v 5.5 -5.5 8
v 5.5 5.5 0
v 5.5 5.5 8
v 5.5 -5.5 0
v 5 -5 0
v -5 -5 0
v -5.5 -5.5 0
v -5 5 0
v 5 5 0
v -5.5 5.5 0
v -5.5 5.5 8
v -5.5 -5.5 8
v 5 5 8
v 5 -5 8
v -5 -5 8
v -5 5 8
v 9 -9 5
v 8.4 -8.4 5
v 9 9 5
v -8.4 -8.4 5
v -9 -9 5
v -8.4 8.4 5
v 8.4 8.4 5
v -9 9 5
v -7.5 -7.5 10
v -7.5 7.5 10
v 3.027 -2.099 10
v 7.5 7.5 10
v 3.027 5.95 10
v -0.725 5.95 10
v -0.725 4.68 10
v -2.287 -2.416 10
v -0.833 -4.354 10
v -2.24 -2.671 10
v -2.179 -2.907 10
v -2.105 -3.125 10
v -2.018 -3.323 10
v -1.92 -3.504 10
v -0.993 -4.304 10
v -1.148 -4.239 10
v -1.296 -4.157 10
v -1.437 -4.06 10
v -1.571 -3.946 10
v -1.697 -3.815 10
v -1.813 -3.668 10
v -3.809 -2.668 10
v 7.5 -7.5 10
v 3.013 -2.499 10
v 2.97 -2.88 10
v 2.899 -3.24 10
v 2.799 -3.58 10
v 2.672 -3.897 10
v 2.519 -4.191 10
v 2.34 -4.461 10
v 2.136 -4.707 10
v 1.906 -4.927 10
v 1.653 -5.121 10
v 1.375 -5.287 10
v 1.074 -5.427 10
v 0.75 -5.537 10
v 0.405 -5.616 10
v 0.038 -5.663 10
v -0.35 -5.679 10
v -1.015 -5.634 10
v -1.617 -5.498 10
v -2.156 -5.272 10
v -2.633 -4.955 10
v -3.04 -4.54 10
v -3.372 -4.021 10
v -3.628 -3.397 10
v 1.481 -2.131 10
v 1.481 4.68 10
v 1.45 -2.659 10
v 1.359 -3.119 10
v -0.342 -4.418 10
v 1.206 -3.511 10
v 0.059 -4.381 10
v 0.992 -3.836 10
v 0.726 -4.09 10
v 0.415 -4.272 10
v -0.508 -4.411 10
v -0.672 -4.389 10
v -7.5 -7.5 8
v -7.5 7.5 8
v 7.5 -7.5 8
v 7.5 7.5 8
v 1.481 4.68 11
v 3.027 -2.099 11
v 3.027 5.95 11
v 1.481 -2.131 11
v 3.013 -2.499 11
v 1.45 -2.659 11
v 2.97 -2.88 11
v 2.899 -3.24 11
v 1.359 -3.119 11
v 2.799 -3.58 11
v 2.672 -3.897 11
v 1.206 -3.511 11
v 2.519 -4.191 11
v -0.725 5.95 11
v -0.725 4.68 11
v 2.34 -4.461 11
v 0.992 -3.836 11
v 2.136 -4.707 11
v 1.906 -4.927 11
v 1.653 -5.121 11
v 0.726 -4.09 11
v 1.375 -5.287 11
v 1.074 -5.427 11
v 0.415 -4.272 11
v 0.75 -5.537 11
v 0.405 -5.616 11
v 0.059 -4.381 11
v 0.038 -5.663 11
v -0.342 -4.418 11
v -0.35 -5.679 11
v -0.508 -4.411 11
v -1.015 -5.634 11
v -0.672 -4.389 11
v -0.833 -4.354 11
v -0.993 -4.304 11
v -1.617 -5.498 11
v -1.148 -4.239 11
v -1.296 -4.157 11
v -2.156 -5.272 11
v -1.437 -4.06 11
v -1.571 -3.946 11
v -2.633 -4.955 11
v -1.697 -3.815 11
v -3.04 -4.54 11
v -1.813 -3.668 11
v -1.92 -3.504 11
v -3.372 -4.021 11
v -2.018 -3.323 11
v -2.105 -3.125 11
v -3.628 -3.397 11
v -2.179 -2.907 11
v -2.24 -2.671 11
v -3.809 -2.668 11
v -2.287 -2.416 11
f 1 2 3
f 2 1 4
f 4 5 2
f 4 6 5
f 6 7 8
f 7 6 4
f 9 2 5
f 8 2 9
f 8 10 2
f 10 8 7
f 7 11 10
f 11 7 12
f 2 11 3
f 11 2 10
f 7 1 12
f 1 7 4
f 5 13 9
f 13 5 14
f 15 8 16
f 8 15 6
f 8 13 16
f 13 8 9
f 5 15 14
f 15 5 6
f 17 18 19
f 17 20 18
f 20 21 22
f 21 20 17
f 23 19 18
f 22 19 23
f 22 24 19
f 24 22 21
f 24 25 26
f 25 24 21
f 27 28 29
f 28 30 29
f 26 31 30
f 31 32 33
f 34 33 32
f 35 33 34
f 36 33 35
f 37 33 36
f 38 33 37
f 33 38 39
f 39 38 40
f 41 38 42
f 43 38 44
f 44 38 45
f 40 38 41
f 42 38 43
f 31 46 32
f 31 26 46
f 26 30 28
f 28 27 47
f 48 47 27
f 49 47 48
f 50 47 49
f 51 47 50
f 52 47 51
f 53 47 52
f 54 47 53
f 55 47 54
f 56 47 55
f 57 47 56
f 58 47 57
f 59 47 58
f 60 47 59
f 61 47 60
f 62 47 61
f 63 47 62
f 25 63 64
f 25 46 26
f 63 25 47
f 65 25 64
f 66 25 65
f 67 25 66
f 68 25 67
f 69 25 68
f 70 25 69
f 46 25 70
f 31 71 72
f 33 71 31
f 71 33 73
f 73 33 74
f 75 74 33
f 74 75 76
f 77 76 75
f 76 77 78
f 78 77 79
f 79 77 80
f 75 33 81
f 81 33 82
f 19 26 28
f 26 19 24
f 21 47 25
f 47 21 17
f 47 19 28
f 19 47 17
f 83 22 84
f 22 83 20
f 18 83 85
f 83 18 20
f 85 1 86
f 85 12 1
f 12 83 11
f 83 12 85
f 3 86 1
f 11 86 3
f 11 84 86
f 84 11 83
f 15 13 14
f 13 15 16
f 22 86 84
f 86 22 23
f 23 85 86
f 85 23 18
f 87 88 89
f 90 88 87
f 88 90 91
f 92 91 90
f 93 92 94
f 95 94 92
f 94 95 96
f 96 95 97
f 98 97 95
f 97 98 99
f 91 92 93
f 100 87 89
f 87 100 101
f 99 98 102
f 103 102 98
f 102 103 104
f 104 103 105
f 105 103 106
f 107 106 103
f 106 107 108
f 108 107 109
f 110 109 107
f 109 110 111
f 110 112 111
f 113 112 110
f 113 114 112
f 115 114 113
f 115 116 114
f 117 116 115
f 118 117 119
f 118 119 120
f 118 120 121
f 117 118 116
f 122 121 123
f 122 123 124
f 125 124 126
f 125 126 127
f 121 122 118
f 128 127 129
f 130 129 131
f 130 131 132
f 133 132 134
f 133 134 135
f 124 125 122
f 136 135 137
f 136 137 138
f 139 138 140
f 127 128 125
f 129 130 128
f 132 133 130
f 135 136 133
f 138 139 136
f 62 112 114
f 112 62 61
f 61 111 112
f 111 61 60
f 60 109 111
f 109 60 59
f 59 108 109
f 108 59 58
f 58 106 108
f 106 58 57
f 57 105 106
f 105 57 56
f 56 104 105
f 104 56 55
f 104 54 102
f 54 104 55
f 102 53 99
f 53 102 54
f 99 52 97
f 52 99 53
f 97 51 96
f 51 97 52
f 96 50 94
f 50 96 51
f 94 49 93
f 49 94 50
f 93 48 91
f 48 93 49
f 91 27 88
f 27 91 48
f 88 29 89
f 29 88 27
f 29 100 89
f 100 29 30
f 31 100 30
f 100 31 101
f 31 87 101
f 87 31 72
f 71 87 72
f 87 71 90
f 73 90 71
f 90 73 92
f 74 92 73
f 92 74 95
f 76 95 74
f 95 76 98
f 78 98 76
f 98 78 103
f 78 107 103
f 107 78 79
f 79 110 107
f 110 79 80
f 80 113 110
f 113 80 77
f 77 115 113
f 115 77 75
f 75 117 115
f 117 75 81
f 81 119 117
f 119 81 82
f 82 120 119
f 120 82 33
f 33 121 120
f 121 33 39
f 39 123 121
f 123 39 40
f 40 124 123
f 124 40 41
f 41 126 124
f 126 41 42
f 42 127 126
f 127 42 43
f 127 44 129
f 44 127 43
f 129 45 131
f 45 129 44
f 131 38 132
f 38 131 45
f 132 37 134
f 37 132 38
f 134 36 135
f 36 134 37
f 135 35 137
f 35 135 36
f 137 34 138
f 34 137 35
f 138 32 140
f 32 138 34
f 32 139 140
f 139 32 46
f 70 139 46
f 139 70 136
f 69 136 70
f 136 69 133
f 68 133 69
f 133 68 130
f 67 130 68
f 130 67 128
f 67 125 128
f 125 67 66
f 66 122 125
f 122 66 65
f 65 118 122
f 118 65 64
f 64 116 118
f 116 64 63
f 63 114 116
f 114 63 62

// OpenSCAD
thickness = 1;
label = "J";

bottomSize = [18, 18];
topSize = [15, 15];
connectorSize = [10, 10];
keyHeight = 5;
totalHeight = 10;

translate([0, 0, totalHeight / 2 - thickness / 2]) difference()
{
	cube([connectorSize[0] + thickness, connectorSize[1] + thickness, totalHeight - thickness], true);
	cube([connectorSize[0], connectorSize[1], totalHeight + thickness], true);
};

module pyramid(h, l1, w1, l2, w2)
{
	dl = (l1 - l2) / 2;
	dw = (w1 - w2) / 2;
	polyhedron([
			[0, 0, 0], [l1, 0, 0], [l1, w1, 0], [0, w1, 0],
			[dl, dw, h], [l2 + dl, dw, h], [l2 + dl, w2 + dw, h], [dl, w2 + dw, h],
		],
		[
			[0, 1, 2, 3], [7, 6, 5, 4], //bottom, top
			[4, 5, 1, 0], [5, 6, 2, 1], [6, 7, 3, 2], [7, 4, 0, 3] //4 sides
		]
	);
};

translate([-bottomSize[0] / 2, -bottomSize[1] / 2, keyHeight]) difference()
{
	pyramid(keyHeight, bottomSize[0], bottomSize[1], topSize[0], topSize[1]);
	translate([0, 0, -thickness * 2]) pyramid(keyHeight, bottomSize[0], bottomSize[1], topSize[0], topSize[1]);
}

#translate([0, 0, totalHeight])
	linear_extrude(thickness)
	text(label, 12, valign = "center", halign = "center");
